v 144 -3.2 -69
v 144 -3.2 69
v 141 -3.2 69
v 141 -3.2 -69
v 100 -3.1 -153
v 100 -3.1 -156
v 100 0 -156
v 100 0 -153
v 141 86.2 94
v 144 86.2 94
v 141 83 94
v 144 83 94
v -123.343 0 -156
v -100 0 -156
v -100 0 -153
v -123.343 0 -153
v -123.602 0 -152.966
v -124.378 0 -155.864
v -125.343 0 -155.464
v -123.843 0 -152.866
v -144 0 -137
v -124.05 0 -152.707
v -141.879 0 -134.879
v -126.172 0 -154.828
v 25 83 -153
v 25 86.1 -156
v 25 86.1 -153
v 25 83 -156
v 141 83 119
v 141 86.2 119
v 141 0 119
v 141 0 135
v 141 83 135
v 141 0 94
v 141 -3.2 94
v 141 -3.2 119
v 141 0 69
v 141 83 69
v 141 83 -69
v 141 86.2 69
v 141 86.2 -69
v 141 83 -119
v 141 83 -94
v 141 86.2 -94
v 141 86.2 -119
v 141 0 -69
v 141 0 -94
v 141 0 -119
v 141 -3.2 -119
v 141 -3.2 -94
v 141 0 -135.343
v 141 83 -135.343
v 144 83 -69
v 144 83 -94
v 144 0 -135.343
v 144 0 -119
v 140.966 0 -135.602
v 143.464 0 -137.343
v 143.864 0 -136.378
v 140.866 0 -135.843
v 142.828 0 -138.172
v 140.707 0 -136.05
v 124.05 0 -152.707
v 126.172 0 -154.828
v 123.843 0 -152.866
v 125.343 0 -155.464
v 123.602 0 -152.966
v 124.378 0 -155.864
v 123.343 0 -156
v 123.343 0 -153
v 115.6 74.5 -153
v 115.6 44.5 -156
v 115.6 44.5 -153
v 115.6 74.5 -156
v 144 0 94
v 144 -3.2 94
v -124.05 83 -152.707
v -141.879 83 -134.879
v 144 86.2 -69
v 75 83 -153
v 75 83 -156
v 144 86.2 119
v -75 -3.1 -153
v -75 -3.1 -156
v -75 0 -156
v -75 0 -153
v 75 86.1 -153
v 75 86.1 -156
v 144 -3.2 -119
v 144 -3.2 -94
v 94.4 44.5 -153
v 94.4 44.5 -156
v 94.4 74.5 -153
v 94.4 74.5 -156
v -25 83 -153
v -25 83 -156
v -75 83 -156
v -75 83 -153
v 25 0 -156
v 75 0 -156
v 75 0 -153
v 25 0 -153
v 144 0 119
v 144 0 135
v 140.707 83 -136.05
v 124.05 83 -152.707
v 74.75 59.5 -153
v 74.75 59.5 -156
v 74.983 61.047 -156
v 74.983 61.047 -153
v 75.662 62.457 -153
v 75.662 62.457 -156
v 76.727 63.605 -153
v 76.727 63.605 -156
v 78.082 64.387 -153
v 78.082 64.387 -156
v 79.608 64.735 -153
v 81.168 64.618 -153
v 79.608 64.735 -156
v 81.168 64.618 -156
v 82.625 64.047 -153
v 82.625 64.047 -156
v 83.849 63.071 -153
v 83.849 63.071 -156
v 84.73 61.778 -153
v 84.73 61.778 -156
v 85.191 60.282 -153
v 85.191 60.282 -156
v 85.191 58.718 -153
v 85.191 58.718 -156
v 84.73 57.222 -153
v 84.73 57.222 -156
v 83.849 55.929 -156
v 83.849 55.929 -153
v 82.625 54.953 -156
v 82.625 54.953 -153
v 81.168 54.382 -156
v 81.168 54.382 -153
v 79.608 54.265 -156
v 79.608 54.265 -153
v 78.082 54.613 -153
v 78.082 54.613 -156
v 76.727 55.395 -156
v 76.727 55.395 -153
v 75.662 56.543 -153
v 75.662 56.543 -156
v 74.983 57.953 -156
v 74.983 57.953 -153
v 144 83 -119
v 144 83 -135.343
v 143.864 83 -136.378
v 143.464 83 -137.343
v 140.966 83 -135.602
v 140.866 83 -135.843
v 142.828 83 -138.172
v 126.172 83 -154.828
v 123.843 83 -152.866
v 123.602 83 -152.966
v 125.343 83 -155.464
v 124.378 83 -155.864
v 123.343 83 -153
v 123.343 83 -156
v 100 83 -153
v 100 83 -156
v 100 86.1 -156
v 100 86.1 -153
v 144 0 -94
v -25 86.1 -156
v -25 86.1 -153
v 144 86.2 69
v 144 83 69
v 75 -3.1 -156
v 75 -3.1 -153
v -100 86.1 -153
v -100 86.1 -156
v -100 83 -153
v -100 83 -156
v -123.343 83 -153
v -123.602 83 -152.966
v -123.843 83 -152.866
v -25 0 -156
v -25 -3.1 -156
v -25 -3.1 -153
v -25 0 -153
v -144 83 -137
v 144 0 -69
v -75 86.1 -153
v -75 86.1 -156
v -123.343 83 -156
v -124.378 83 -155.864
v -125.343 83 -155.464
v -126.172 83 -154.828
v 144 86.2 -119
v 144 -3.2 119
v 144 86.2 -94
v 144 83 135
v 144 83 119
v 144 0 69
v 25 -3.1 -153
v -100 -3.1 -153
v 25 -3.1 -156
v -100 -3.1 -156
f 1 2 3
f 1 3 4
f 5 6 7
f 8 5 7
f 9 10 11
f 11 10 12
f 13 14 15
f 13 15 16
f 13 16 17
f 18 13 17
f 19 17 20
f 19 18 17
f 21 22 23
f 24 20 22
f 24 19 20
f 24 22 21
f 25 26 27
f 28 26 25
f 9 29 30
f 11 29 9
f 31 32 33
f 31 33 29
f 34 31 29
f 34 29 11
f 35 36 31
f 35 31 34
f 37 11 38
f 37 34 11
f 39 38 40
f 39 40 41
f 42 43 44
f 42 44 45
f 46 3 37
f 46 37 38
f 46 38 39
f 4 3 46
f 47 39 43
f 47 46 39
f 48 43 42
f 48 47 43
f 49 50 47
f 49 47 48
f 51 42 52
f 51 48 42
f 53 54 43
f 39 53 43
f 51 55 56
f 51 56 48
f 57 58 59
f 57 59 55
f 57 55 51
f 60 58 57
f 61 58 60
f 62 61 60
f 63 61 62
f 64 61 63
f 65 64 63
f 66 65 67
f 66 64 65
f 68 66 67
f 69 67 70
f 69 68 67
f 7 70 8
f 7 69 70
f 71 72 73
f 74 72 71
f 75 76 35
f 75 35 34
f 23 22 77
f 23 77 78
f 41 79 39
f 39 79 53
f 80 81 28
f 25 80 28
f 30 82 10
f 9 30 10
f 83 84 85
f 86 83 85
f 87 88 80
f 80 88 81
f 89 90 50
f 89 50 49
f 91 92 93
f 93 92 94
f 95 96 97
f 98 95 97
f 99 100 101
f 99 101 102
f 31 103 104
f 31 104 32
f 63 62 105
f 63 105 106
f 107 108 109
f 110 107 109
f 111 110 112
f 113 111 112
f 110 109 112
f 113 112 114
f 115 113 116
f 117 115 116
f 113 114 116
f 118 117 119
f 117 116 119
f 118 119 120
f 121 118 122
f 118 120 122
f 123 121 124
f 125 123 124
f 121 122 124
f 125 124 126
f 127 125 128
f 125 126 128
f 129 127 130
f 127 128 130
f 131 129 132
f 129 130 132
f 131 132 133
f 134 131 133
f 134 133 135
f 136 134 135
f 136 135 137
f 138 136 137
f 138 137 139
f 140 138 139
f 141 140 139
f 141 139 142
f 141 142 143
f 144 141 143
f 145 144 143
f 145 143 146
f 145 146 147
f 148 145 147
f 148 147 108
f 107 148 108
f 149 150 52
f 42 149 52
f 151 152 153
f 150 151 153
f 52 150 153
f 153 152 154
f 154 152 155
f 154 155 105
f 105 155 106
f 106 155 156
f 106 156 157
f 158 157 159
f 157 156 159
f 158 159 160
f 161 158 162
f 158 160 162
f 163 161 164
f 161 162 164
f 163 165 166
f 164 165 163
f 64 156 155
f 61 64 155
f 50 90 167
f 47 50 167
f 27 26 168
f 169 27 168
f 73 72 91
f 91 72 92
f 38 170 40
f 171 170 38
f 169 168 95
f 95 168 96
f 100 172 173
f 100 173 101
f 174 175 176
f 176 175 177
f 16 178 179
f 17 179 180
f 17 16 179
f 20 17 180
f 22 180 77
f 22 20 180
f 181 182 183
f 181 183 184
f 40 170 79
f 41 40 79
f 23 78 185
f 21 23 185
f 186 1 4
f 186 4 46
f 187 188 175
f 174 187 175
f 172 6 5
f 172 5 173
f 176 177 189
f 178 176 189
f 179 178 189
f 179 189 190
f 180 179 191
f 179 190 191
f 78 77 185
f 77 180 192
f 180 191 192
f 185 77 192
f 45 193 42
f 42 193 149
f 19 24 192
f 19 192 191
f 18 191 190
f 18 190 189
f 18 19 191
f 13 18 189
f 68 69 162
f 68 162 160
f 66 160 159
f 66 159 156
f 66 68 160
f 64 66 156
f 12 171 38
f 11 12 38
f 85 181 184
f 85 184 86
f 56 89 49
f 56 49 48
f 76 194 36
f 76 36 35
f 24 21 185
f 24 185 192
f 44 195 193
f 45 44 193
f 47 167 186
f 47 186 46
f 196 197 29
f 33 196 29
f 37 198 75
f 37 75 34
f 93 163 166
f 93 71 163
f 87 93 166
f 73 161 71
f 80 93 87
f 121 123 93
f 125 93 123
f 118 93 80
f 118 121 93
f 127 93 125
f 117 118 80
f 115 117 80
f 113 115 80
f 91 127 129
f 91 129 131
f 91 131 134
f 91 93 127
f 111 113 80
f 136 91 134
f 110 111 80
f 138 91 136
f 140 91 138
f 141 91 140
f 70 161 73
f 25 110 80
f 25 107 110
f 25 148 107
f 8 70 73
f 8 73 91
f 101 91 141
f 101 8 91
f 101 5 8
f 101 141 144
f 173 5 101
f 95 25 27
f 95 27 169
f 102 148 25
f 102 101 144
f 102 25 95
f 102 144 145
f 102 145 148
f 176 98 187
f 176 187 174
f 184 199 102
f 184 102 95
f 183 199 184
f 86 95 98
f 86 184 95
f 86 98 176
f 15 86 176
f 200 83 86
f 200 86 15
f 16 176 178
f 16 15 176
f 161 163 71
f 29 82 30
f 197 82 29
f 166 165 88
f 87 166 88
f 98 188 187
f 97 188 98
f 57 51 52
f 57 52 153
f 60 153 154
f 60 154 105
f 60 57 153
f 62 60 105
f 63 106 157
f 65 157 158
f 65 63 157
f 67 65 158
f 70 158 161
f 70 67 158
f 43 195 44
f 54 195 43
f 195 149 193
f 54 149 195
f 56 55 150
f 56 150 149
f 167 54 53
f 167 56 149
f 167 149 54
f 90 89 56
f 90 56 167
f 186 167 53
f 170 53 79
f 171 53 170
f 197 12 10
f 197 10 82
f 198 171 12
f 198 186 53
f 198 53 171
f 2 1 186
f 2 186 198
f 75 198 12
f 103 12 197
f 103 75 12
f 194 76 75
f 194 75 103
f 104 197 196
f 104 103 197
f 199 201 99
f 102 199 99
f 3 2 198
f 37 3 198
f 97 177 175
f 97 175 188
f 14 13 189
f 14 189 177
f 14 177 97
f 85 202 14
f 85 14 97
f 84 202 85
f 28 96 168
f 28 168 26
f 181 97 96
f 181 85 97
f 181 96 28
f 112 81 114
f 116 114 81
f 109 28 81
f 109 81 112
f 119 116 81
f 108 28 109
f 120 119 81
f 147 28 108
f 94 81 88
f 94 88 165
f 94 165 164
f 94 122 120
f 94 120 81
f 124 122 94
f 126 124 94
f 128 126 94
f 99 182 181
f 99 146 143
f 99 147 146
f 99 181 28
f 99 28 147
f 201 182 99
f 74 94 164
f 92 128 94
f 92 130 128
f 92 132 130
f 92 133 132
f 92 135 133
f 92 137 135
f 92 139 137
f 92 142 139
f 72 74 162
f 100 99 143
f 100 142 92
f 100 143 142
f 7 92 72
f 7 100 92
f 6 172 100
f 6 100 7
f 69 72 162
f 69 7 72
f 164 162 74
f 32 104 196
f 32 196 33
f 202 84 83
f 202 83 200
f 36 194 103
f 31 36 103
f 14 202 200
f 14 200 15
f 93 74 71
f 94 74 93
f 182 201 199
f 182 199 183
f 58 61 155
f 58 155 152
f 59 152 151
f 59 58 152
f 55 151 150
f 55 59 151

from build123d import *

# Parameters (mm, degrees)
BASE_FLANGE1_DEPTH  = 83
SKETCH2_W           = 50
SKETCH2_H           = 3.1
SKETCH2_W_2         = 25
BOSS_EXTRUDE1_DEPTH = 3
SKETCH3_W           = 138
SKETCH3_H           = 3.2
SKETCH3_W_2         = 25
BOSS_EXTRUDE2_DEPTH = 3
CUT_EXTRUDE1_REACH  = 337.928
SKETCH4_R           = 5.25
SKETCH4_W           = 21.2
SKETCH4_H           = 30


# Sheet-metal steps are written as plain solids
with BuildPart() as part:
    # Sketch1 → Base-Flange1 (new body)
    with BuildSketch(Plane(origin=(0, 0, 0), x_dir=(1, 0, 0), z_dir=(0, 1, 0))):
        with BuildLine():
            Line((-144, 137), (-126.171572875, 154.828427125))
            ThreePointArc((-126.171572875, 154.828427125), (-124.87387948, 155.69551813), (-123.343145751, 156))
            Line((-123.343145751, 156), (123.343145751, 156))
            ThreePointArc((123.343145751, 156), (124.87387948, 155.69551813), (126.171572875, 154.828427125))
            Line((126.171572875, 154.828427125), (142.828427125, 138.171572875))
            ThreePointArc((142.828427125, 138.171572875), (143.69551813, 136.87387948), (144, 135.343145751))
            Line((144, 135.343145751), (144, -135))
            Line((144, -135), (141, -135))
            Line((141, -135), (141, 135.343145751))
            ThreePointArc((141, 135.343145751), (140.923879533, 135.725829183), (140.707106781, 136.050252532))
            Line((140.707106781, 136.050252532), (124.050252532, 152.707106781))
            ThreePointArc((124.050252532, 152.707106781), (123.725829183, 152.923879533), (123.343145751, 153))
            Line((123.343145751, 153), (-123.343145751, 153))
            ThreePointArc((-123.343145751, 153), (-123.725829183, 152.923879533), (-124.050252532, 152.707106781))
            Line((-124.050252532, 152.707106781), (-141.878679656, 134.878679656))
            Line((-141.878679656, 134.878679656), (-144, 137))
        make_face()
    extrude(amount=BASE_FLANGE1_DEPTH)

    # Sketch2 → Boss-Extrude1 (add)
    with BuildSketch(Plane(origin=(0, 0, -156), x_dir=(-1, 0, 0), z_dir=(0, 0, -1))):
        with Locations((0, -1.55)):
            Rectangle(SKETCH2_W, SKETCH2_H)
        with Locations((-87.5, -1.55)):
            Rectangle(SKETCH2_W_2, SKETCH2_H)
        with Locations((87.5, -1.55)):
            Rectangle(SKETCH2_W_2, SKETCH2_H)
    boss_extrude1 = extrude(amount=-BOSS_EXTRUDE1_DEPTH)

    # Sketch3 → Boss-Extrude2 (add)
    with BuildSketch(Plane(origin=(144, 0, 0), x_dir=(0, 0, -1), z_dir=(1, 0, 0))):
        with Locations((0, -1.6)):
            Rectangle(SKETCH3_W, SKETCH3_H)
        with Locations((106.5, -1.6)):
            Rectangle(SKETCH3_W_2, SKETCH3_H)
        with Locations((-106.5, -1.6)):
            Rectangle(SKETCH3_W_2, SKETCH3_H)
    boss_extrude2 = extrude(amount=-BOSS_EXTRUDE2_DEPTH)

    # Mirror1: Boss-Extrude1, Boss-Extrude2 across plane
    add(boss_extrude1.mirror(Plane.ZX.offset(41.5)))
    add(boss_extrude2.mirror(Plane.ZX.offset(41.5)))

    # Sketch4 → Cut-Extrude1 (cut, up to next)
    with BuildSketch(Plane(origin=(0, 0, -156), x_dir=(-1, 0, 0), z_dir=(0, 0, -1)), mode=Mode.PRIVATE) as cut_extrude1_sk1:
        with Locations((-80, 59.5)):
            Circle(SKETCH4_R)
    cut_extrude1_tool1 = extrude(cut_extrude1_sk1.sketch, amount=-CUT_EXTRUDE1_REACH, mode=Mode.PRIVATE) & part.part
    # Sketch4 → Cut-Extrude1 (cut, up to next)
    with BuildSketch(Plane(origin=(0, 0, -156), x_dir=(-1, 0, 0), z_dir=(0, 0, -1)), mode=Mode.PRIVATE) as cut_extrude1_sk2:
        with Locations((-105, 59.5)):
            Rectangle(SKETCH4_W, SKETCH4_H)
    cut_extrude1_tool2 = extrude(cut_extrude1_sk2.sketch, amount=-CUT_EXTRUDE1_REACH, mode=Mode.PRIVATE) & part.part
    add(cut_extrude1_tool1.solids().sort_by_distance((80, 59.5, -156))[0], mode=Mode.SUBTRACT)
    add(cut_extrude1_tool2.solids().sort_by_distance((105, 59.5, -156))[0], mode=Mode.SUBTRACT)


solid = part.part
